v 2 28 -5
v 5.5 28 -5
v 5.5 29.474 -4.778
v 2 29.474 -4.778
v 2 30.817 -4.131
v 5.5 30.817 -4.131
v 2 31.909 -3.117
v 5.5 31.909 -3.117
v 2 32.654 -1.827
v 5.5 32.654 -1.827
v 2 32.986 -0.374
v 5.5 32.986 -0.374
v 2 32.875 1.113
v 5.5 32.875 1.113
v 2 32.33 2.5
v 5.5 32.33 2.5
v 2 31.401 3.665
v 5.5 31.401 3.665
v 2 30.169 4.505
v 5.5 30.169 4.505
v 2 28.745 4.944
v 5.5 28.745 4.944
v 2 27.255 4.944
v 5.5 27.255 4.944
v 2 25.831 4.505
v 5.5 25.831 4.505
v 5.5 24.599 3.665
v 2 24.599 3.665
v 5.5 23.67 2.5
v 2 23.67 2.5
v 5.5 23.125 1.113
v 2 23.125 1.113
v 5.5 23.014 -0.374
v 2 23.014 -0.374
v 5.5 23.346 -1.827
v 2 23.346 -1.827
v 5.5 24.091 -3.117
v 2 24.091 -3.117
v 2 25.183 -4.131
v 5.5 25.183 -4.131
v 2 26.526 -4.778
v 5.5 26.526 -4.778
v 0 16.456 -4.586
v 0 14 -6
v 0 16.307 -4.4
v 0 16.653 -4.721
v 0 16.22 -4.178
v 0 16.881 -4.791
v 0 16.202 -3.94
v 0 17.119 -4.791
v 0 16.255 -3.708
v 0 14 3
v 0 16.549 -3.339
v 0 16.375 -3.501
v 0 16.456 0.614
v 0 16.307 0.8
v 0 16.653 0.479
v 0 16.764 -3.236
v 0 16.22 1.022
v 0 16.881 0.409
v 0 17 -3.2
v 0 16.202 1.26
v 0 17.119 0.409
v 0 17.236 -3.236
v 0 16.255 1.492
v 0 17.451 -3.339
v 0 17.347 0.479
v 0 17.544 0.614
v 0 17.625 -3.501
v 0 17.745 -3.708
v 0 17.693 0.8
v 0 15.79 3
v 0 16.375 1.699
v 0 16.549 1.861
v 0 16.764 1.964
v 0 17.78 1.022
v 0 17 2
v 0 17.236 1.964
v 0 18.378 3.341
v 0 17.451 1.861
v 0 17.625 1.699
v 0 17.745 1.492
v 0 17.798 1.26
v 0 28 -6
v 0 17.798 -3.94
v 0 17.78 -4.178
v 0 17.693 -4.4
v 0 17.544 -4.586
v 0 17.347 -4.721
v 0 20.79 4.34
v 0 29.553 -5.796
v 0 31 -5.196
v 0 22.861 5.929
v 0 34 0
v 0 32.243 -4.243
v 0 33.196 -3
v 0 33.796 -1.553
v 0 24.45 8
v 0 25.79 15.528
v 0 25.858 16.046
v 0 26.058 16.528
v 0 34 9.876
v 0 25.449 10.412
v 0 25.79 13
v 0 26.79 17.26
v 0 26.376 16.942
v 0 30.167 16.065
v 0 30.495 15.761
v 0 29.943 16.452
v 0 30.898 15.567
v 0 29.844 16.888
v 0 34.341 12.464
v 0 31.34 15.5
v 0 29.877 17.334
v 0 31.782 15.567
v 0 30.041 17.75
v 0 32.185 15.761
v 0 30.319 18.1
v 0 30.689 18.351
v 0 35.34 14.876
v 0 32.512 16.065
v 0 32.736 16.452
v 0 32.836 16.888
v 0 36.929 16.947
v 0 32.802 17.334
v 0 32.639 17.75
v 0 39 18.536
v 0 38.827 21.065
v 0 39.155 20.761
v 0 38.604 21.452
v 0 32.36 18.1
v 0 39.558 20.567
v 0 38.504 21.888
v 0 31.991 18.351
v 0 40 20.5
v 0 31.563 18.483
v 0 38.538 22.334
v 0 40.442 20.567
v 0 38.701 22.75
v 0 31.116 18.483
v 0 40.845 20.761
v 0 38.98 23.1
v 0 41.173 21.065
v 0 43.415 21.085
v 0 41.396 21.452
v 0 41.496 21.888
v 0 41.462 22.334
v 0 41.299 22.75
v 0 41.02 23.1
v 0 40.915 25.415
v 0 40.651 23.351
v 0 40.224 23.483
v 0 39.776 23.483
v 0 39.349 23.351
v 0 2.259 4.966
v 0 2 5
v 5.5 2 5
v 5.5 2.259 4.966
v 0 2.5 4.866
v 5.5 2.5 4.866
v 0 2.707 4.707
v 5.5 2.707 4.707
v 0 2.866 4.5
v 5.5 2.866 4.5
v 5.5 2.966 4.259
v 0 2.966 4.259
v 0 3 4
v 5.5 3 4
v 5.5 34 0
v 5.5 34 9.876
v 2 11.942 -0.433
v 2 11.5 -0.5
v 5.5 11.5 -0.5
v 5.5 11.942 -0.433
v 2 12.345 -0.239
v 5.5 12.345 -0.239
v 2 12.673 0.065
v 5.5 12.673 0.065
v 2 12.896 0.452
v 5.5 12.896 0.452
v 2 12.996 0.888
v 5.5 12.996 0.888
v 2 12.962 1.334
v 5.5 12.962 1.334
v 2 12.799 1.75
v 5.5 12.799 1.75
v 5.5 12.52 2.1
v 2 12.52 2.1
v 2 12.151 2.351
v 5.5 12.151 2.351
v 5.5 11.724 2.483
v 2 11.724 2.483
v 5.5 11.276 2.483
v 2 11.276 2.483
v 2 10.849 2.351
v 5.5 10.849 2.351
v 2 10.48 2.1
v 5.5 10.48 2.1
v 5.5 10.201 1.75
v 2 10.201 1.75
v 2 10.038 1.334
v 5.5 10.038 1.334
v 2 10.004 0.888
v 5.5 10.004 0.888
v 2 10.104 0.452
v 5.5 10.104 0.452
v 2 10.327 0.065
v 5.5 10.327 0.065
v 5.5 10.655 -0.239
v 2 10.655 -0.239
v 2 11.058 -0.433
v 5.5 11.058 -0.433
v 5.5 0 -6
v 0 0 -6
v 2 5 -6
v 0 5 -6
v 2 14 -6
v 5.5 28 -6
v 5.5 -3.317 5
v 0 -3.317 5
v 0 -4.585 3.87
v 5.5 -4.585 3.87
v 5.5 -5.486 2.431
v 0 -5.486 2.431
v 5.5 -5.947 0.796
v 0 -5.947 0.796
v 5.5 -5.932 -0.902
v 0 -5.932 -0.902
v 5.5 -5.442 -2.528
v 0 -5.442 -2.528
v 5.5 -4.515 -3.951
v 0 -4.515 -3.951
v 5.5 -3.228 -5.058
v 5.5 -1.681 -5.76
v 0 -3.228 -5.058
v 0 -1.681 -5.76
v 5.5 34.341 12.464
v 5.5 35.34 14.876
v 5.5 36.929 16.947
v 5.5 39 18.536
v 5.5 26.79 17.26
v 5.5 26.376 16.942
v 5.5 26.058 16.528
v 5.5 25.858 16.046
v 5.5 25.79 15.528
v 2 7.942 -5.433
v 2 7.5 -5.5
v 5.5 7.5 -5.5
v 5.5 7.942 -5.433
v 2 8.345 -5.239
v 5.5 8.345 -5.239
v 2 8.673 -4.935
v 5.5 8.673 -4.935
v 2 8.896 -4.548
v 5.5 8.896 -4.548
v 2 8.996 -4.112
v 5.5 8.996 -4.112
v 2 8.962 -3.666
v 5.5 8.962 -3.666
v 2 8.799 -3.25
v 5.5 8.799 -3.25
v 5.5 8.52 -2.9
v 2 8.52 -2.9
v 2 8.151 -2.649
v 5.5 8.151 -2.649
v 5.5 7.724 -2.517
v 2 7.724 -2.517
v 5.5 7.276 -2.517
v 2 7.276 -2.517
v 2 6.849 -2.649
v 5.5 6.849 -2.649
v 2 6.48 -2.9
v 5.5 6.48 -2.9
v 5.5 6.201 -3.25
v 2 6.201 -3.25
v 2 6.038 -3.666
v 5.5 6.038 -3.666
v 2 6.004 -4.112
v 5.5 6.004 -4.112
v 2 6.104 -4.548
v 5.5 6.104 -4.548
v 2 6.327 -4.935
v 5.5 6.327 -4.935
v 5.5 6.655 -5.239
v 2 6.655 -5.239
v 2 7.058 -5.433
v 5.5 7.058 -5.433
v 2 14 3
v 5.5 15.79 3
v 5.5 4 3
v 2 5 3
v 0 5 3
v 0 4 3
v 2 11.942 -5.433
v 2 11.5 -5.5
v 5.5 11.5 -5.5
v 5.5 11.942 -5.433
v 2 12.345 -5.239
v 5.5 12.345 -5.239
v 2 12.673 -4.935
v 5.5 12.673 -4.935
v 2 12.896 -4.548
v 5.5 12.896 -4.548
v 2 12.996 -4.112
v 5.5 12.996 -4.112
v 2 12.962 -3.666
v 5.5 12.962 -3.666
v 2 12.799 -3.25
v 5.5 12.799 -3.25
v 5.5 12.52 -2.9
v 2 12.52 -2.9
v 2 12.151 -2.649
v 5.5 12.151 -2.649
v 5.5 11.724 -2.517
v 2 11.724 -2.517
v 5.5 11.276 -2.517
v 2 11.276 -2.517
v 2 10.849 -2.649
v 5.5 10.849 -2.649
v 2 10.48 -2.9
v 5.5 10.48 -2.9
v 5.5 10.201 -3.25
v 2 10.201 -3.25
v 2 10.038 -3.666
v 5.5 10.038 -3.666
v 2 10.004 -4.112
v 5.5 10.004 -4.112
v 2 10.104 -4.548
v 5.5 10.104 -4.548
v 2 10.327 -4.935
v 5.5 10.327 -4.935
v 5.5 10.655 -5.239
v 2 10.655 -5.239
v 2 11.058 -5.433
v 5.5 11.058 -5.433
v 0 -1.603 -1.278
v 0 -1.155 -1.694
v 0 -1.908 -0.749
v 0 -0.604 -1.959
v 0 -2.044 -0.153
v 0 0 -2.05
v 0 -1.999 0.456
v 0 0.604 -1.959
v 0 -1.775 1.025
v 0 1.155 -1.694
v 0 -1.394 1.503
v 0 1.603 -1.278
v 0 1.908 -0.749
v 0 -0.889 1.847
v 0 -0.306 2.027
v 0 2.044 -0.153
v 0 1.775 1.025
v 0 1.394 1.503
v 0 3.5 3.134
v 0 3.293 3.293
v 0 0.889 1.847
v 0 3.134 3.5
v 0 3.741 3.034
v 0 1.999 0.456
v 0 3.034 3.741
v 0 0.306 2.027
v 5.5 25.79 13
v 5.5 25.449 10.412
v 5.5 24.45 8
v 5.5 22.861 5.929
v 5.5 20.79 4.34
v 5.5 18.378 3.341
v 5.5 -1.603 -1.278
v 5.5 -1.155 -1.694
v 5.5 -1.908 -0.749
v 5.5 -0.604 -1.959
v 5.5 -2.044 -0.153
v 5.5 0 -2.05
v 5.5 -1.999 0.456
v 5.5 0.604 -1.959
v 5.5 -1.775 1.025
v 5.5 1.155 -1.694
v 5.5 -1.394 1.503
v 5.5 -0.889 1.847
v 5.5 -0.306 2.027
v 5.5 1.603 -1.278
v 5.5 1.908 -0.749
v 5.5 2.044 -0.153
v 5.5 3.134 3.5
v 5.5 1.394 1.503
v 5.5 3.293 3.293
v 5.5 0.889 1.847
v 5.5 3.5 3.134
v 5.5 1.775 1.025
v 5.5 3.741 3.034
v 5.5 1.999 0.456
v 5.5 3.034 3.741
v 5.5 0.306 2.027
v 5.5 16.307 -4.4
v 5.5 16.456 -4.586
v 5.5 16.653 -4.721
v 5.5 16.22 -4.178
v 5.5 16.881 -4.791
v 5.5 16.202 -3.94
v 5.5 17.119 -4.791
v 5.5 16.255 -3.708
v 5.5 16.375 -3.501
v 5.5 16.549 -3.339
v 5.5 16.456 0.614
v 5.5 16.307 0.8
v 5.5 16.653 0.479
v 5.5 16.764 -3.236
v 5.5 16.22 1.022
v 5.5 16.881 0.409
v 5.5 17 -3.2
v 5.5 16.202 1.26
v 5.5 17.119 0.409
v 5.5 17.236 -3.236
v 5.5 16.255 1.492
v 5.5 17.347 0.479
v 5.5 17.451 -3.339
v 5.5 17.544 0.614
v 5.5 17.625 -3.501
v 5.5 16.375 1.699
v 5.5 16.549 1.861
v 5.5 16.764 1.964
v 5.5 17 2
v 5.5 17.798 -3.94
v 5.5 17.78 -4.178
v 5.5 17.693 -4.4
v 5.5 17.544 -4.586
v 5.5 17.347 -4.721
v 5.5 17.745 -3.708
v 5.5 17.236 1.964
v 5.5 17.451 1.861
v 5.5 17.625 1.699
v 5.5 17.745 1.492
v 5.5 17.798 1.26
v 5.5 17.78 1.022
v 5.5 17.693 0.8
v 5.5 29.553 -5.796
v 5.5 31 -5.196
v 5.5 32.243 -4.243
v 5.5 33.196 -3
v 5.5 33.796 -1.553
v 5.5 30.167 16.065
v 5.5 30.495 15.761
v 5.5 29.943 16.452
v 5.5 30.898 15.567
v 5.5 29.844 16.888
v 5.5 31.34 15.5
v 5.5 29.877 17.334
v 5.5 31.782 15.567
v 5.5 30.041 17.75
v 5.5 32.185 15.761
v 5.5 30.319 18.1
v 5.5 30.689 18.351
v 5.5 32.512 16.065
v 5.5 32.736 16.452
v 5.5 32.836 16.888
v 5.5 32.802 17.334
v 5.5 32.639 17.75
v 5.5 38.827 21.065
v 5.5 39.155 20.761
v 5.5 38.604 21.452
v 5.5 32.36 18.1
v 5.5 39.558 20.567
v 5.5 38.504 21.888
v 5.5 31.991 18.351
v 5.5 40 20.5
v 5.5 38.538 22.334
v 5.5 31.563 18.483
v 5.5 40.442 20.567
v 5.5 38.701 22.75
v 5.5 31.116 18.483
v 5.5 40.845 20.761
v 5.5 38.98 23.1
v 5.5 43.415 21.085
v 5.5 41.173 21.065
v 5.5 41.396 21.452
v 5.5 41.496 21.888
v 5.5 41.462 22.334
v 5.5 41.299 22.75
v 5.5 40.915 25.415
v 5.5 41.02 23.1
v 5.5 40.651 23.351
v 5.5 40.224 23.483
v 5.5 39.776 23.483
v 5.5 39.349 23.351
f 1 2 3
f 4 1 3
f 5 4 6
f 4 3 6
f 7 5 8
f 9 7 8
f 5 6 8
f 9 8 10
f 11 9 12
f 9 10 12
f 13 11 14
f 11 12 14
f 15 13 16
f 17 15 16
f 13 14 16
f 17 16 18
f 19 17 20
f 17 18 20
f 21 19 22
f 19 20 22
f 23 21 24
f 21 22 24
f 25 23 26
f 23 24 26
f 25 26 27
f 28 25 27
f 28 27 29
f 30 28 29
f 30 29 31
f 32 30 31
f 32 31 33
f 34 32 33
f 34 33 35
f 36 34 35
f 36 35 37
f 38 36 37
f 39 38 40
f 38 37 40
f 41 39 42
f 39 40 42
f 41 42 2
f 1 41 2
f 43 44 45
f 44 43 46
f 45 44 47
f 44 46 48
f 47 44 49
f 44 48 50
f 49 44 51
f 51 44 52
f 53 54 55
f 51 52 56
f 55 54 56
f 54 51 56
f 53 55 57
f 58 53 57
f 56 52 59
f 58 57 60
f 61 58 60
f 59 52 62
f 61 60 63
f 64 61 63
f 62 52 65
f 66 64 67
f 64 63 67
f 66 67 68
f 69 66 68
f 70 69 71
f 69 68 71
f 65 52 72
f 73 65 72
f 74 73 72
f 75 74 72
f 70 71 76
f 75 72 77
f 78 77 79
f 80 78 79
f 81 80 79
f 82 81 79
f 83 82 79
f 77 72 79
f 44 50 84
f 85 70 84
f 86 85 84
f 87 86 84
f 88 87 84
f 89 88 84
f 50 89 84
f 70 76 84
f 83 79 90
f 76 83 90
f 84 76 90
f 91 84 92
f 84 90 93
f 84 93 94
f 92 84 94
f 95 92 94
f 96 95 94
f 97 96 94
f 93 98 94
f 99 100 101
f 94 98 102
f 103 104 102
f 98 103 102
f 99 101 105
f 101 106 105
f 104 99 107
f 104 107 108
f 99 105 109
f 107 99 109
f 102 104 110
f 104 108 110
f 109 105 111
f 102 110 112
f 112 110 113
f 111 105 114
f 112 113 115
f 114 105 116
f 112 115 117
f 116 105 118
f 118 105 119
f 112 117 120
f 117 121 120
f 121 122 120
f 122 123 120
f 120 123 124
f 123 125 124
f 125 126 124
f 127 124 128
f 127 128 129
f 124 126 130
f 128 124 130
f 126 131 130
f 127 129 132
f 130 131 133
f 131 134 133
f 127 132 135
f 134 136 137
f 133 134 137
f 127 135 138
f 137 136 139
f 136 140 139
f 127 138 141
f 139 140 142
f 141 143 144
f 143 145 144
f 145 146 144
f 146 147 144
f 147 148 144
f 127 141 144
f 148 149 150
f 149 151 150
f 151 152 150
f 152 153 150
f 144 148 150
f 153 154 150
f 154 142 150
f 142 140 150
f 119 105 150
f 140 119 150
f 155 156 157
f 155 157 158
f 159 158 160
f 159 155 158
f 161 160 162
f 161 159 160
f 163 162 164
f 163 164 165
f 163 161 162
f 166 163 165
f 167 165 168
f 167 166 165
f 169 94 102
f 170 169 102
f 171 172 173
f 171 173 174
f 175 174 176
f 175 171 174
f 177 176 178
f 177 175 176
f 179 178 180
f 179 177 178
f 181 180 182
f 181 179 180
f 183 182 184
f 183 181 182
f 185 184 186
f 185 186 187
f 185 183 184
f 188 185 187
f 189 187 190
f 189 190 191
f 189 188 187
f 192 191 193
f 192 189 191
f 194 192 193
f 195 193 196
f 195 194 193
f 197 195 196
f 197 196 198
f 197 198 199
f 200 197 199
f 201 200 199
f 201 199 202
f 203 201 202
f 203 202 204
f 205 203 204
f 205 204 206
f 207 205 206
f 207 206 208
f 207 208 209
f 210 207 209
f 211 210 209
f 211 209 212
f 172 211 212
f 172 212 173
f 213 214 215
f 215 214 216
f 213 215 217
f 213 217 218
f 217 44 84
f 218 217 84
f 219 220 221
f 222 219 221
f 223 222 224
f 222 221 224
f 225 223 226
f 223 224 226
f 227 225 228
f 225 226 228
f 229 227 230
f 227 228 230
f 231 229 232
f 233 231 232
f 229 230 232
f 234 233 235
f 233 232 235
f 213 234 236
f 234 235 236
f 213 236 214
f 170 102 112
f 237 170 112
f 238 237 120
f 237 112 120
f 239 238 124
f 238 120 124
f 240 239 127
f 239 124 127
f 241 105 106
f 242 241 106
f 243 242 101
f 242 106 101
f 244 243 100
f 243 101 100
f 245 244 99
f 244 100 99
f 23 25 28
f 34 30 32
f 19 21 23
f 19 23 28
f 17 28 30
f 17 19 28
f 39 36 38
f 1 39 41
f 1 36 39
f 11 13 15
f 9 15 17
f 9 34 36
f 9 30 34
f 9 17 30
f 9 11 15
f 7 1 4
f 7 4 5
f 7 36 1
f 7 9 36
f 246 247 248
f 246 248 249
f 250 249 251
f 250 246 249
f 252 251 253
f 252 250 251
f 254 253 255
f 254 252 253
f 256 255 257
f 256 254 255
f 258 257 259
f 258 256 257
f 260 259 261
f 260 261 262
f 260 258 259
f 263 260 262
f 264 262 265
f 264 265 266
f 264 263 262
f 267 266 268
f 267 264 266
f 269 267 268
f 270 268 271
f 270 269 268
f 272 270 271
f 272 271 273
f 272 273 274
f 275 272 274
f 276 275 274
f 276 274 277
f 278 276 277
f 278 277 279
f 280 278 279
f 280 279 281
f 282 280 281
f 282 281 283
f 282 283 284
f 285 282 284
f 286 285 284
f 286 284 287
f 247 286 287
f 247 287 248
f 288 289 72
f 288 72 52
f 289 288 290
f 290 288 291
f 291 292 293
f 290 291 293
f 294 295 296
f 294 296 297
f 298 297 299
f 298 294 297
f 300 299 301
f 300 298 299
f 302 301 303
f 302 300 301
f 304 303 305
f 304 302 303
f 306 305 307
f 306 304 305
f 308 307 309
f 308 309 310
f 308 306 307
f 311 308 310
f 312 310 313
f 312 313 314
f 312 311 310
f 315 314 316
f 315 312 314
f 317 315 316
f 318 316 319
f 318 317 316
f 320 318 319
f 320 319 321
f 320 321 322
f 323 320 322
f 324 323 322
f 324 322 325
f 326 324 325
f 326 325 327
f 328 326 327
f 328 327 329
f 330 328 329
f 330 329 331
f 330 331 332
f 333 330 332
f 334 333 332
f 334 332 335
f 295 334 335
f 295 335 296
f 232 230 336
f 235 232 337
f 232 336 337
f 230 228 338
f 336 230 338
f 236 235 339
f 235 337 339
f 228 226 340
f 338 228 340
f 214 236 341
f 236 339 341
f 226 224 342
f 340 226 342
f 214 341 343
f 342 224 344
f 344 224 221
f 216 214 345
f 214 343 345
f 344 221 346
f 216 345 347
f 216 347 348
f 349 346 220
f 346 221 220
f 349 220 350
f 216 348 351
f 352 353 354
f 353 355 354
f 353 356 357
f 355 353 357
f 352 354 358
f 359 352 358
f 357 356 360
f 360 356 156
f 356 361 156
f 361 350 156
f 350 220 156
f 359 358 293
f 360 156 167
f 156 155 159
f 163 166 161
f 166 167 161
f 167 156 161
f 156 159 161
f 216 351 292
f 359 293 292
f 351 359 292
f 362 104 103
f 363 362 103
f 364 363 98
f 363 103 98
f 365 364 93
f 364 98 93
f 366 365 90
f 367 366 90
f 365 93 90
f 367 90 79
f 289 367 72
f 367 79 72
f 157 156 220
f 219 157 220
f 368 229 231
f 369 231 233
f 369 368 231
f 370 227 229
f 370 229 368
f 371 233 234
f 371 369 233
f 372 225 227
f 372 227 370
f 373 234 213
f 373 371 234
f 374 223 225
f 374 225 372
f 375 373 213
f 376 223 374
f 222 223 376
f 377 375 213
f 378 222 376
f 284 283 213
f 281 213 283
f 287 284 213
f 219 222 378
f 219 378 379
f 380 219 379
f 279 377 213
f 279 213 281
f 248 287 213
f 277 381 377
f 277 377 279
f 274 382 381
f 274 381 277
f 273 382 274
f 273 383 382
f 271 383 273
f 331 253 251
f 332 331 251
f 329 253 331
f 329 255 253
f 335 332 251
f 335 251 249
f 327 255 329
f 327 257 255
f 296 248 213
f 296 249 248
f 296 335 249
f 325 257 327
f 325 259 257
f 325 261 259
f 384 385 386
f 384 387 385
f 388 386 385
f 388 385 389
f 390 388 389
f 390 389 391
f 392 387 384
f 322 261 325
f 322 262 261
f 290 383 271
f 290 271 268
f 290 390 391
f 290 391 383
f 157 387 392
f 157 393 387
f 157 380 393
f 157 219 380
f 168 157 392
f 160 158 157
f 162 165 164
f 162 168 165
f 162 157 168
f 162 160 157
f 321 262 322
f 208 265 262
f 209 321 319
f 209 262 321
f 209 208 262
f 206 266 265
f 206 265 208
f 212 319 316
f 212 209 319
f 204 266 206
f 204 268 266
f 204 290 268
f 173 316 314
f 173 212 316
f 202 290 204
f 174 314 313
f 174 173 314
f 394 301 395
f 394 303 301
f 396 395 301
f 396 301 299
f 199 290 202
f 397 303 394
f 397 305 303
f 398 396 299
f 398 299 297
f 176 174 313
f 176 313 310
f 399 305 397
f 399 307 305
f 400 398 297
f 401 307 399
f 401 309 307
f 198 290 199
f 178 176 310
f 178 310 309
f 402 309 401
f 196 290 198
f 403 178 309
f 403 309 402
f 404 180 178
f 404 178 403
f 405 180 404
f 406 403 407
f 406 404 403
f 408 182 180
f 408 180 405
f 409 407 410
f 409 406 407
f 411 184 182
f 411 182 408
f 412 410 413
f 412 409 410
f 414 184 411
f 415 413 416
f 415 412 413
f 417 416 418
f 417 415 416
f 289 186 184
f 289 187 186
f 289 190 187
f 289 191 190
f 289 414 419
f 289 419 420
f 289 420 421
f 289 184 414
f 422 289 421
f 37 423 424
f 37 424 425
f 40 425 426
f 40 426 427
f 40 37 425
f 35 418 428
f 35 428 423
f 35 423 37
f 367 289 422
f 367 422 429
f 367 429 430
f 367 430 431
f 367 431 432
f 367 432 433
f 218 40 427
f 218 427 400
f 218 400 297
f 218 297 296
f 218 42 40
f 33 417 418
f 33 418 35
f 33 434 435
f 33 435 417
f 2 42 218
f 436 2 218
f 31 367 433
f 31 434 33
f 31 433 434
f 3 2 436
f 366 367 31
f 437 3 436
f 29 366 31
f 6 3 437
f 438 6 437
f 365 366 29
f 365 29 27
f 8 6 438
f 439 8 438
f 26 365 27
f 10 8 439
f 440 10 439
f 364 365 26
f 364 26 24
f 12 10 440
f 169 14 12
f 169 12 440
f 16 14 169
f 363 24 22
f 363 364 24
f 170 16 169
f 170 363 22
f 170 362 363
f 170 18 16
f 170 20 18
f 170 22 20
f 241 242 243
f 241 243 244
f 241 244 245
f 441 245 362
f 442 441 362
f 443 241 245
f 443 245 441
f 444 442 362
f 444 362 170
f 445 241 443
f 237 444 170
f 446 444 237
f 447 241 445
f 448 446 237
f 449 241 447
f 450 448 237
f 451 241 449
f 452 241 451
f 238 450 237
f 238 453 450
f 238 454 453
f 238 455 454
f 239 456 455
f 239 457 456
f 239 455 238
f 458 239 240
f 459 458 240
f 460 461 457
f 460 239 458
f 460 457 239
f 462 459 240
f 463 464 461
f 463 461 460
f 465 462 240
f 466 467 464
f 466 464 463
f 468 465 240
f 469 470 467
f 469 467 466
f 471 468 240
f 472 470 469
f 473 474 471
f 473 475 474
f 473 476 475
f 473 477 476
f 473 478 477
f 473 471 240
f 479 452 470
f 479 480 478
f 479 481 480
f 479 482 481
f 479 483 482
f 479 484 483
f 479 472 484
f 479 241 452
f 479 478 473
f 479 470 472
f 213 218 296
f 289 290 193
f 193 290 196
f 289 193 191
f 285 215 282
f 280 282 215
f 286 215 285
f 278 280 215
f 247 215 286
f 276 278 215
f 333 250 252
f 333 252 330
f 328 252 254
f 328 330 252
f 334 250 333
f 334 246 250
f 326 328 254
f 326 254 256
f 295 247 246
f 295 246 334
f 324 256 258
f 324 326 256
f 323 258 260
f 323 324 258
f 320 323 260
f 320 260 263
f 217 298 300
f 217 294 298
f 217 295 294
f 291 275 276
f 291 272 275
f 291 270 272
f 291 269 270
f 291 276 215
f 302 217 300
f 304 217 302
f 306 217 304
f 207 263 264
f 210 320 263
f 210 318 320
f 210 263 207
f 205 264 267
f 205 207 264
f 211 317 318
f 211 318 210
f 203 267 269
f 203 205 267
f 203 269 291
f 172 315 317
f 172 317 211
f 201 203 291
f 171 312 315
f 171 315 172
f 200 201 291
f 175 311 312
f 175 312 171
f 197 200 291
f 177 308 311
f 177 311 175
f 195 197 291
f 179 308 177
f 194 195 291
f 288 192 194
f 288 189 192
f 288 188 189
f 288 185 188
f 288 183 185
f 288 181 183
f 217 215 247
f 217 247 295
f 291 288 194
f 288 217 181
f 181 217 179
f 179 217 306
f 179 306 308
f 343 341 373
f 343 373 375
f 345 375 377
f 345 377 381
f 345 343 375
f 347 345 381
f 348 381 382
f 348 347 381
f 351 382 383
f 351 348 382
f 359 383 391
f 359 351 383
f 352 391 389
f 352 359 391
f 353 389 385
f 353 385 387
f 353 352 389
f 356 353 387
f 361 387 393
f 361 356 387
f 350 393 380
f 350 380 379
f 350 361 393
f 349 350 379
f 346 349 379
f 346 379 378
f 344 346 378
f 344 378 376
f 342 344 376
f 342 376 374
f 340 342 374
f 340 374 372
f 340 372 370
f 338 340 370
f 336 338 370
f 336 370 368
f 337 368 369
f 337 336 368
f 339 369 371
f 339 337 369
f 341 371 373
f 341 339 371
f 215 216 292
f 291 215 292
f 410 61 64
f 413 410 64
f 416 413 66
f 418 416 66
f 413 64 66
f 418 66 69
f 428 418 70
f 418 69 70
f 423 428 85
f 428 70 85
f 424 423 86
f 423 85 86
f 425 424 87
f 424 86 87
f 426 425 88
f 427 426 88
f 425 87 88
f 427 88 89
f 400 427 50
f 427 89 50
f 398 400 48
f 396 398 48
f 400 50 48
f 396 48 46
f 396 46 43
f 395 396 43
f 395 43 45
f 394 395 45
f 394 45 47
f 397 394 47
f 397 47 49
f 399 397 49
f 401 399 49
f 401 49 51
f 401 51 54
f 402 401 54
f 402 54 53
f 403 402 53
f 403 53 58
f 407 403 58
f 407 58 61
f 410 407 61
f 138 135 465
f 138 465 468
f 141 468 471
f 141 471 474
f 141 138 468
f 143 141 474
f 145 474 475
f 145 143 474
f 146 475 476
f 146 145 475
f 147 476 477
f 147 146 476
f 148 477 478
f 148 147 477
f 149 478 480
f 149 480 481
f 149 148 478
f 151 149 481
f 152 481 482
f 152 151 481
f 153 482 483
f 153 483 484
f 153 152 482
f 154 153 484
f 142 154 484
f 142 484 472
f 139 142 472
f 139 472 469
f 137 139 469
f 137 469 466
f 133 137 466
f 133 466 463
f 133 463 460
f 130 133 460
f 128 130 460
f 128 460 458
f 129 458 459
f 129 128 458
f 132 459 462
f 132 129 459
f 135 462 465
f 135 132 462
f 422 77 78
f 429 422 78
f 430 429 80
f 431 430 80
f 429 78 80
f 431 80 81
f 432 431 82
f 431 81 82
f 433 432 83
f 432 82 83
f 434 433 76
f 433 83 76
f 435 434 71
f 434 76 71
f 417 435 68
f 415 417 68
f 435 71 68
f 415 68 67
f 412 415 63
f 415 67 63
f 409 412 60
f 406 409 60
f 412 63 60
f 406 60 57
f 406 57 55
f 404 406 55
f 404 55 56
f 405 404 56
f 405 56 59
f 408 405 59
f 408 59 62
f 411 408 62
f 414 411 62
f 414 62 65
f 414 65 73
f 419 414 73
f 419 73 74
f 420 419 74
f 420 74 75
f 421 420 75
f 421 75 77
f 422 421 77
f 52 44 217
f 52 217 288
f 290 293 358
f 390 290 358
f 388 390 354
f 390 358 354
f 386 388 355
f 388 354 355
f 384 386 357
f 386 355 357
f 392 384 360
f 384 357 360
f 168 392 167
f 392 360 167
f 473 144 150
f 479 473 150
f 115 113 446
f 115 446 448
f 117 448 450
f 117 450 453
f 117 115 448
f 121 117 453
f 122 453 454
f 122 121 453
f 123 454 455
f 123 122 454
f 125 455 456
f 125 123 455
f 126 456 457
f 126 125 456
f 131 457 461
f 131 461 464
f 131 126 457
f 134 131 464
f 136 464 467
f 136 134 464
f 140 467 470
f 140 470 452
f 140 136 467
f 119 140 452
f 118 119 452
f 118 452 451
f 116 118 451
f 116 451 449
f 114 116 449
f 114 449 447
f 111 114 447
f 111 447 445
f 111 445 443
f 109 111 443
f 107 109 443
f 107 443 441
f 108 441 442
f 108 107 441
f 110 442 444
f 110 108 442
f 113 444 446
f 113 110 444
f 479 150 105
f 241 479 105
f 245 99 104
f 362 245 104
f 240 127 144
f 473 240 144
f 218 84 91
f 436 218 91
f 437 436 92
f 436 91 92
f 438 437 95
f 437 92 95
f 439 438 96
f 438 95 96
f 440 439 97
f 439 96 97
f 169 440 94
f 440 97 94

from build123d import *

# Parameters (mm, degrees)
SKETCH1_R                   = 2.05
SKETCH1_R_2                 = 1.5
BOSS_EXTRUDE1_DEPTH         = 5.5
FILLET1_START               = -1
FILLET1_DEPTH               = 7
FILLET1_2_DEPTH             = 5.5
TAP_DRILL_FOR_M2X0_4_TAP1_D = 1.6
SKETCH4_W                   = 9
SKETCH4_H                   = 9
CUT_EXTRUDE1_DEPTH          = 2
SKETCH5_R                   = 5
CUT_EXTRUDE2_DEPTH          = 3.5


with BuildPart() as part:
    # Sketch1 → Boss-Extrude1 (new body)
    with BuildSketch(Plane(origin=(0, 0, 0), x_dir=(0, 0, -1), z_dir=(1, 0, 0))):
        with BuildLine():
            Line((6, 0), (6, 28))
            ThreePointArc((6, 28), (4.242640687, 32.242640687), (0, 34))
            Line((0, 34), (-9.875644347, 34))
            ThreePointArc((-9.875644347, 34), (-14.875644347, 35.339745962), (-18.535898385, 39))
            Line((-18.535898385, 39), (-21.084936491, 43.415063509))
            Line((-21.084936491, 43.415063509), (-25.415063509, 40.915063509))
            Line((-25.415063509, 40.915063509), (-17.260063509, 26.790189174))
            ThreePointArc((-17.260063509, 26.790189174), (-16.528012702, 26.058138366), (-15.528012702, 25.790189174))
            Line((-15.528012702, 25.790189174), (-13, 25.790189174))
            ThreePointArc((-13, 25.790189174), (-5.928932188, 22.861256986), (-3, 15.790189174))
            Line((-3, 15.790189174), (-3, 3))
            Line((-3, 3), (-5, 3))
            Line((-5, 3), (-5, -3.31662479))
            ThreePointArc((-5, -3.31662479), (1.732050808, -5.744562647), (6, 0))
        make_face()
        Circle(SKETCH1_R, mode=Mode.SUBTRACT)
        with Locations((-22, 40)):
            Circle(SKETCH1_R_2, mode=Mode.SUBTRACT)
        with Locations((-17, 31.339745962)):
            Circle(SKETCH1_R_2, mode=Mode.SUBTRACT)
        with Locations((-1, 11.5)):
            Circle(SKETCH1_R_2, mode=Mode.SUBTRACT)
        with Locations((4, 11.5)):
            Circle(SKETCH1_R_2, mode=Mode.SUBTRACT)
        with Locations((4, 7.5)):
            Circle(SKETCH1_R_2, mode=Mode.SUBTRACT)
    extrude(amount=BOSS_EXTRUDE1_DEPTH)

    # Fillet1: read off the stored shape, not the designer's step
    # Fillet1 outline → Fillet1 (cut)
    with BuildSketch(Plane.YZ.offset(FILLET1_START)):
        with BuildLine():
            ThreePointArc((2, 5), (2.707106781, 4.707106781), (3, 4))
            Line((3, 4), (3, 5))
            Line((3, 5), (2, 5))
        make_face()
    extrude(amount=FILLET1_DEPTH, mode=Mode.SUBTRACT)

    # Fillet1 2 outline → Fillet1 2 (add)
    with BuildSketch(Plane.YZ):
        with BuildLine():
            ThreePointArc((4, 3), (3.292893219, 3.292893219), (3, 4))
            Line((3, 4), (3, 3))
            Line((3, 3), (4, 3))
        make_face()
    extrude(amount=FILLET1_2_DEPTH)

    # Tap Drill for M2x0.4 Tap1 (through all)
    with Locations(Plane(origin=(5.5, 0, 0), x_dir=(0, 0, -1), z_dir=(1, 0, 0))):
        with Locations((-1.2, 17), (4, 17)):
            Hole(TAP_DRILL_FOR_M2X0_4_TAP1_D / 2)

    # Sketch4 → Cut-Extrude1 (cut)
    with BuildSketch(Plane.ZY):
        with Locations((-1.5, 9.5)):
            Rectangle(SKETCH4_W, SKETCH4_H)
    extrude(amount=-CUT_EXTRUDE1_DEPTH, mode=Mode.SUBTRACT)

    # Sketch5 → Cut-Extrude2 (cut)
    with BuildSketch(Plane(origin=(5.5, 0, 0), x_dir=(0, 0, -1), z_dir=(1, 0, 0))):
        with Locations((0, 28)):
            Circle(SKETCH5_R)
    extrude(amount=-CUT_EXTRUDE2_DEPTH, mode=Mode.SUBTRACT)


solid = part.part
